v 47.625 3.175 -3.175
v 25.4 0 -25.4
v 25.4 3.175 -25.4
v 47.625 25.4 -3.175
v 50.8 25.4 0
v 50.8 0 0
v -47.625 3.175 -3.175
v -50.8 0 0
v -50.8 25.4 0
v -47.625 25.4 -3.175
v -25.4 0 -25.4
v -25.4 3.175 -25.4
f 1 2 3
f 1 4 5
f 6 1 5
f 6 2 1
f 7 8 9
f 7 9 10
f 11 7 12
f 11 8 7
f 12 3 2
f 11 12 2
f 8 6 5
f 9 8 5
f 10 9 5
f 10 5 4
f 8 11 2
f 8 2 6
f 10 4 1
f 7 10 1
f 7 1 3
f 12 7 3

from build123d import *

# Parameters (mm, degrees)
BOSS_EXTRUDE1_DEPTH     = 50.8
CUT_EXTRUDE1_DEPTH      = 26.4
CUT_EXTRUDE1_DEPTH_BACK = 1


with BuildPart() as part:
    # Sketch1 → Boss-Extrude1 (new body, symmetric)
    with BuildSketch(Plane(origin=(0, 0, 0), x_dir=(0, 0, -1), z_dir=(1, 0, 0))):
        Polygon((0, 0), (0, 25.4), (3.175, 25.4), (3.175, 3.175), (25.4, 3.175), (25.4, 0), align=None)
    extrude(amount=BOSS_EXTRUDE1_DEPTH, both=True)

    # Sketch2 → Cut-Extrude1 (cut, two sides)
    with BuildSketch(Plane(origin=(0, 0, 0), x_dir=(1, 0, 0), z_dir=(0, 1, 0))) as cut_extrude1_sk:
        Polygon((-50.8, 0), (-25.4, 25.4), (-50.8, 25.4), align=None)
        Polygon((50.8, 0), (50.8, 25.4), (25.4, 25.4), align=None)
    extrude(amount=CUT_EXTRUDE1_DEPTH, mode=Mode.SUBTRACT)
    extrude(cut_extrude1_sk.sketch, amount=-CUT_EXTRUDE1_DEPTH_BACK, mode=Mode.SUBTRACT)


solid = part.part
